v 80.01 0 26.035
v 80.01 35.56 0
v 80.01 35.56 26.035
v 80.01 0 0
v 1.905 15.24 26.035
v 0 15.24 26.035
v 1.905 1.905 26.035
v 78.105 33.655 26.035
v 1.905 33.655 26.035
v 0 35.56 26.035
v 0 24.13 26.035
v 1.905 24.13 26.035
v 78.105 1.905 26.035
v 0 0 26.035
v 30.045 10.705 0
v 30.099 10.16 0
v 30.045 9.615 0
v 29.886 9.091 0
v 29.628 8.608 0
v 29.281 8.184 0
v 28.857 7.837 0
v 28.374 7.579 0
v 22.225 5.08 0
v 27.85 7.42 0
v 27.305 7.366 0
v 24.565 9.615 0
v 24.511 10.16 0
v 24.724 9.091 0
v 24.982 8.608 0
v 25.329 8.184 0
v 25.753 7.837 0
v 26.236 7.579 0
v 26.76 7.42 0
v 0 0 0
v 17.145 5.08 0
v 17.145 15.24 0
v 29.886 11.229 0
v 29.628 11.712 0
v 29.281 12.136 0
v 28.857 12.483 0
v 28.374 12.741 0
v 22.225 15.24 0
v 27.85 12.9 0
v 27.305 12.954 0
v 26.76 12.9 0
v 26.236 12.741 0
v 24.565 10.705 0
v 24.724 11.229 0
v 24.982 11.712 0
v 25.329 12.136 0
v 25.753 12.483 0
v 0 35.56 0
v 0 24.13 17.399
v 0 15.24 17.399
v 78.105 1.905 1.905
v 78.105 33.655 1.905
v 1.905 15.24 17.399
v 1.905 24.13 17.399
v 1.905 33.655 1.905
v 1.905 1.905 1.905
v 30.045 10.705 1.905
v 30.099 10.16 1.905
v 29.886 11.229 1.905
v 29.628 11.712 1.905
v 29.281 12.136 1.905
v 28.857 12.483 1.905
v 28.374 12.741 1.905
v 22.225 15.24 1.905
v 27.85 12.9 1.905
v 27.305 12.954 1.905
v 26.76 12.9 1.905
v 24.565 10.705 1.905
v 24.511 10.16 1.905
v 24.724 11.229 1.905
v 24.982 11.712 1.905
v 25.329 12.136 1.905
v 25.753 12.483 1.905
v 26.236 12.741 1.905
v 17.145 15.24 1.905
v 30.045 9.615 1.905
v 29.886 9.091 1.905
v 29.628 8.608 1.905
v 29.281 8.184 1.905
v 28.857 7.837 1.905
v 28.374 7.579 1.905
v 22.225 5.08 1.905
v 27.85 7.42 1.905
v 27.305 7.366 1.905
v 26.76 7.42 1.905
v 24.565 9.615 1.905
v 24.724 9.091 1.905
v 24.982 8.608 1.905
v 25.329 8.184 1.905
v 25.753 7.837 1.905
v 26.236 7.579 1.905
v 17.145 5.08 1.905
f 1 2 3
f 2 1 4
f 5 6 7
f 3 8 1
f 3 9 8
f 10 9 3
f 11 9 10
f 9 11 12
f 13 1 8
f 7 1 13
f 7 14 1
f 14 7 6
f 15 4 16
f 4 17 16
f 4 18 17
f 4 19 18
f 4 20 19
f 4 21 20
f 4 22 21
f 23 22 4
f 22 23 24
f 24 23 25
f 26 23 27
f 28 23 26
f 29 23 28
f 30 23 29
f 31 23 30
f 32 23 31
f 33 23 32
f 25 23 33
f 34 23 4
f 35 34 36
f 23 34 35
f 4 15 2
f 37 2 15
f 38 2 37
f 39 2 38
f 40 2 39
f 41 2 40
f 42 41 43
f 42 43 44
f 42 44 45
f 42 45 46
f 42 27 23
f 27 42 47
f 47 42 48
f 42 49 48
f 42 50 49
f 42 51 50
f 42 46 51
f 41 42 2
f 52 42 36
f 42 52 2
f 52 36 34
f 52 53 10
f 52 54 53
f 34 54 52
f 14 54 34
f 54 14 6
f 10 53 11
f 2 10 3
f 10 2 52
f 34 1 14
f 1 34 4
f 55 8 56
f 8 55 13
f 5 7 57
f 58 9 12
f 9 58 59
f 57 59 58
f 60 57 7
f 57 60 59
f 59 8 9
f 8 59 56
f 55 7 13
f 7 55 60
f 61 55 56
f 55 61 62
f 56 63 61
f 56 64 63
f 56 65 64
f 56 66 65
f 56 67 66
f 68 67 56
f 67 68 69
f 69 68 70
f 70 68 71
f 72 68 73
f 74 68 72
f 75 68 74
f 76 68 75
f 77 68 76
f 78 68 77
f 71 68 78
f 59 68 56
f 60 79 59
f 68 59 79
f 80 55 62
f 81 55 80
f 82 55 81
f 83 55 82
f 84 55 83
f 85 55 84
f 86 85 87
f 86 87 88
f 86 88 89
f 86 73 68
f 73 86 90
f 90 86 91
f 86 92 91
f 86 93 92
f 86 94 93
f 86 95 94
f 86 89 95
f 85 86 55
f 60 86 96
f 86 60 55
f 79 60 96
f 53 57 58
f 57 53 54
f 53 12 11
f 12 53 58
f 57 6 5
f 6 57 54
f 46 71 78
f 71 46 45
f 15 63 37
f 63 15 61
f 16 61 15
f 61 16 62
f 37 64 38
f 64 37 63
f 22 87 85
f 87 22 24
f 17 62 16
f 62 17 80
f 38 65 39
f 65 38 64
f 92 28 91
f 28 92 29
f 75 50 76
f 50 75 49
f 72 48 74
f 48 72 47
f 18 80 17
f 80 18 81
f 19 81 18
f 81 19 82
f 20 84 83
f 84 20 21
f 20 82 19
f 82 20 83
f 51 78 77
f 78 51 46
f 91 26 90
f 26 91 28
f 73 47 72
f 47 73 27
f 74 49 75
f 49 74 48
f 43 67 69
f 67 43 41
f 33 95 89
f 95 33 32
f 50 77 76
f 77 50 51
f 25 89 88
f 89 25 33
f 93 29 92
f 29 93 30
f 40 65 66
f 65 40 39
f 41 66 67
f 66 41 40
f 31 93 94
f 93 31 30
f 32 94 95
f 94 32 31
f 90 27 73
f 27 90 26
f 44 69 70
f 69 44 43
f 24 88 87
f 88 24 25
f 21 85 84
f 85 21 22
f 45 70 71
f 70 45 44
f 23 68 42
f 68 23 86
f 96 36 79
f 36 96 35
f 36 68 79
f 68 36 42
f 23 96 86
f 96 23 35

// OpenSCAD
// Battery retainer for FT power pods.

$fn=32; // round things are drawn in 32 segments
Epsilon = 0.001;

// dimensions in inches
WallThickness = 0.075;
InnerWidth = 1.25;
InnerLength = 3.0;
OuterWidth = InnerWidth + 2 * WallThickness;
OuterLength = InnerLength + 2 * WallThickness;
InnerHeight = 1.25 - (0.3 + WallThickness);

OuterHeight = InnerHeight + 2 * WallThickness;

MountHoleOffsetW = 0.025 + WallThickness;
MountHoleOffsetL = 0.25 + WallThickness;
ConnSideWallL = 1.35;

LEDHoleX = 1.075;
LEDHoleY = OuterWidth - 1;

PlugHoleX = 0.775;
PlugHoleY = LEDHoleY;
PlugHoleL = 0.4;
PlugHoleW = 0.2;

PedestalHeight = 0.2;
PinHeight = PedestalHeight + 0.15;
PinDia = 0.08;
PedestalDia = 0.2;

// dimensions in mm for a little while
mm_pinL = 58.0;
mm_pinW = 30.0 - 7.0;
mm_pinOffL = 3.5;
mm_pinOffW = 3.5;
// Now convert -- this is sad, as we're going to convert back at the bottom.
PinSpaceL = mm_pinL / 25.4;
PinSpaceW = mm_pinW / 25.4;
PinLocRL = (mm_pinOffL / 25.4) + MountHoleOffsetL;
PinLocRW = (mm_pinOffW / 25.4) + MountHoleOffsetW;

SwitchL = 2.7;
SwitchW = 1.5;
LED_L = 2.2;
LED_W = 1.5;

SwitchDia = 0.2625;
LED_Dia = 0.22;

SlotW = 0.5;
SlotStartL = InnerLength * 0.15;
SlotL = InnerLength * 0.75;

SlotStartW = 0.7; 

module Slot() {
   cylinder(d=SlotW, h = 3*WallThickness);
   translate([SlotL, 0, 0]) cylinder(d=SlotW, h = 3 * WallThickness);
   translate([0, -0.5 * SlotW, -2 * WallThickness])
     cube([SlotL, SlotW, 10 * WallThickness]);
}

module ReliefSlots() {
  translate([SlotStartL, SlotStartW, -WallThickness])
    Slot();
}

CameraSlotL = 0.45;
CameraWid = 0.35;

module Walls() {
  difference() {
    cube([OuterLength, OuterWidth, OuterHeight]);
    union() {
      translate([WallThickness, WallThickness, WallThickness * 0.9]) cube([InnerLength, InnerWidth, OuterHeight]);
    }
  }
}

module BasePlate() {
  union() {
    cube([OuterLength, OuterWidth, WallThickness]);
  }
}

module TopSlot() {
  translate([0, WallThickness, -0.01]) cube([0.3, InnerWidth, WallThickness + 0.02]);
}


module LEDSlot() {
   translate([LEDHoleX, LEDHoleY, -Epsilon])
     cylinder(d=LED_Dia, h = 1, center=true);
}

module PlugSlot() {
   translate([PlugHoleX, PlugHoleY, -Epsilon])
     cube([PlugHoleW, PlugHoleL, 1], center=true);
}

scale([25.4,25.4,25.4]) {
  difference() {
     union() {
      BasePlate();
      Walls();
     }
     union() {
       translate([-2*WallThickness, OuterWidth - (CameraSlotL + CameraWid), OuterHeight - CameraWid + 0.01])
         cube([10*WallThickness, CameraWid, CameraWid]);

       LEDSlot();
       PlugSlot();       
     }
   }
 }
